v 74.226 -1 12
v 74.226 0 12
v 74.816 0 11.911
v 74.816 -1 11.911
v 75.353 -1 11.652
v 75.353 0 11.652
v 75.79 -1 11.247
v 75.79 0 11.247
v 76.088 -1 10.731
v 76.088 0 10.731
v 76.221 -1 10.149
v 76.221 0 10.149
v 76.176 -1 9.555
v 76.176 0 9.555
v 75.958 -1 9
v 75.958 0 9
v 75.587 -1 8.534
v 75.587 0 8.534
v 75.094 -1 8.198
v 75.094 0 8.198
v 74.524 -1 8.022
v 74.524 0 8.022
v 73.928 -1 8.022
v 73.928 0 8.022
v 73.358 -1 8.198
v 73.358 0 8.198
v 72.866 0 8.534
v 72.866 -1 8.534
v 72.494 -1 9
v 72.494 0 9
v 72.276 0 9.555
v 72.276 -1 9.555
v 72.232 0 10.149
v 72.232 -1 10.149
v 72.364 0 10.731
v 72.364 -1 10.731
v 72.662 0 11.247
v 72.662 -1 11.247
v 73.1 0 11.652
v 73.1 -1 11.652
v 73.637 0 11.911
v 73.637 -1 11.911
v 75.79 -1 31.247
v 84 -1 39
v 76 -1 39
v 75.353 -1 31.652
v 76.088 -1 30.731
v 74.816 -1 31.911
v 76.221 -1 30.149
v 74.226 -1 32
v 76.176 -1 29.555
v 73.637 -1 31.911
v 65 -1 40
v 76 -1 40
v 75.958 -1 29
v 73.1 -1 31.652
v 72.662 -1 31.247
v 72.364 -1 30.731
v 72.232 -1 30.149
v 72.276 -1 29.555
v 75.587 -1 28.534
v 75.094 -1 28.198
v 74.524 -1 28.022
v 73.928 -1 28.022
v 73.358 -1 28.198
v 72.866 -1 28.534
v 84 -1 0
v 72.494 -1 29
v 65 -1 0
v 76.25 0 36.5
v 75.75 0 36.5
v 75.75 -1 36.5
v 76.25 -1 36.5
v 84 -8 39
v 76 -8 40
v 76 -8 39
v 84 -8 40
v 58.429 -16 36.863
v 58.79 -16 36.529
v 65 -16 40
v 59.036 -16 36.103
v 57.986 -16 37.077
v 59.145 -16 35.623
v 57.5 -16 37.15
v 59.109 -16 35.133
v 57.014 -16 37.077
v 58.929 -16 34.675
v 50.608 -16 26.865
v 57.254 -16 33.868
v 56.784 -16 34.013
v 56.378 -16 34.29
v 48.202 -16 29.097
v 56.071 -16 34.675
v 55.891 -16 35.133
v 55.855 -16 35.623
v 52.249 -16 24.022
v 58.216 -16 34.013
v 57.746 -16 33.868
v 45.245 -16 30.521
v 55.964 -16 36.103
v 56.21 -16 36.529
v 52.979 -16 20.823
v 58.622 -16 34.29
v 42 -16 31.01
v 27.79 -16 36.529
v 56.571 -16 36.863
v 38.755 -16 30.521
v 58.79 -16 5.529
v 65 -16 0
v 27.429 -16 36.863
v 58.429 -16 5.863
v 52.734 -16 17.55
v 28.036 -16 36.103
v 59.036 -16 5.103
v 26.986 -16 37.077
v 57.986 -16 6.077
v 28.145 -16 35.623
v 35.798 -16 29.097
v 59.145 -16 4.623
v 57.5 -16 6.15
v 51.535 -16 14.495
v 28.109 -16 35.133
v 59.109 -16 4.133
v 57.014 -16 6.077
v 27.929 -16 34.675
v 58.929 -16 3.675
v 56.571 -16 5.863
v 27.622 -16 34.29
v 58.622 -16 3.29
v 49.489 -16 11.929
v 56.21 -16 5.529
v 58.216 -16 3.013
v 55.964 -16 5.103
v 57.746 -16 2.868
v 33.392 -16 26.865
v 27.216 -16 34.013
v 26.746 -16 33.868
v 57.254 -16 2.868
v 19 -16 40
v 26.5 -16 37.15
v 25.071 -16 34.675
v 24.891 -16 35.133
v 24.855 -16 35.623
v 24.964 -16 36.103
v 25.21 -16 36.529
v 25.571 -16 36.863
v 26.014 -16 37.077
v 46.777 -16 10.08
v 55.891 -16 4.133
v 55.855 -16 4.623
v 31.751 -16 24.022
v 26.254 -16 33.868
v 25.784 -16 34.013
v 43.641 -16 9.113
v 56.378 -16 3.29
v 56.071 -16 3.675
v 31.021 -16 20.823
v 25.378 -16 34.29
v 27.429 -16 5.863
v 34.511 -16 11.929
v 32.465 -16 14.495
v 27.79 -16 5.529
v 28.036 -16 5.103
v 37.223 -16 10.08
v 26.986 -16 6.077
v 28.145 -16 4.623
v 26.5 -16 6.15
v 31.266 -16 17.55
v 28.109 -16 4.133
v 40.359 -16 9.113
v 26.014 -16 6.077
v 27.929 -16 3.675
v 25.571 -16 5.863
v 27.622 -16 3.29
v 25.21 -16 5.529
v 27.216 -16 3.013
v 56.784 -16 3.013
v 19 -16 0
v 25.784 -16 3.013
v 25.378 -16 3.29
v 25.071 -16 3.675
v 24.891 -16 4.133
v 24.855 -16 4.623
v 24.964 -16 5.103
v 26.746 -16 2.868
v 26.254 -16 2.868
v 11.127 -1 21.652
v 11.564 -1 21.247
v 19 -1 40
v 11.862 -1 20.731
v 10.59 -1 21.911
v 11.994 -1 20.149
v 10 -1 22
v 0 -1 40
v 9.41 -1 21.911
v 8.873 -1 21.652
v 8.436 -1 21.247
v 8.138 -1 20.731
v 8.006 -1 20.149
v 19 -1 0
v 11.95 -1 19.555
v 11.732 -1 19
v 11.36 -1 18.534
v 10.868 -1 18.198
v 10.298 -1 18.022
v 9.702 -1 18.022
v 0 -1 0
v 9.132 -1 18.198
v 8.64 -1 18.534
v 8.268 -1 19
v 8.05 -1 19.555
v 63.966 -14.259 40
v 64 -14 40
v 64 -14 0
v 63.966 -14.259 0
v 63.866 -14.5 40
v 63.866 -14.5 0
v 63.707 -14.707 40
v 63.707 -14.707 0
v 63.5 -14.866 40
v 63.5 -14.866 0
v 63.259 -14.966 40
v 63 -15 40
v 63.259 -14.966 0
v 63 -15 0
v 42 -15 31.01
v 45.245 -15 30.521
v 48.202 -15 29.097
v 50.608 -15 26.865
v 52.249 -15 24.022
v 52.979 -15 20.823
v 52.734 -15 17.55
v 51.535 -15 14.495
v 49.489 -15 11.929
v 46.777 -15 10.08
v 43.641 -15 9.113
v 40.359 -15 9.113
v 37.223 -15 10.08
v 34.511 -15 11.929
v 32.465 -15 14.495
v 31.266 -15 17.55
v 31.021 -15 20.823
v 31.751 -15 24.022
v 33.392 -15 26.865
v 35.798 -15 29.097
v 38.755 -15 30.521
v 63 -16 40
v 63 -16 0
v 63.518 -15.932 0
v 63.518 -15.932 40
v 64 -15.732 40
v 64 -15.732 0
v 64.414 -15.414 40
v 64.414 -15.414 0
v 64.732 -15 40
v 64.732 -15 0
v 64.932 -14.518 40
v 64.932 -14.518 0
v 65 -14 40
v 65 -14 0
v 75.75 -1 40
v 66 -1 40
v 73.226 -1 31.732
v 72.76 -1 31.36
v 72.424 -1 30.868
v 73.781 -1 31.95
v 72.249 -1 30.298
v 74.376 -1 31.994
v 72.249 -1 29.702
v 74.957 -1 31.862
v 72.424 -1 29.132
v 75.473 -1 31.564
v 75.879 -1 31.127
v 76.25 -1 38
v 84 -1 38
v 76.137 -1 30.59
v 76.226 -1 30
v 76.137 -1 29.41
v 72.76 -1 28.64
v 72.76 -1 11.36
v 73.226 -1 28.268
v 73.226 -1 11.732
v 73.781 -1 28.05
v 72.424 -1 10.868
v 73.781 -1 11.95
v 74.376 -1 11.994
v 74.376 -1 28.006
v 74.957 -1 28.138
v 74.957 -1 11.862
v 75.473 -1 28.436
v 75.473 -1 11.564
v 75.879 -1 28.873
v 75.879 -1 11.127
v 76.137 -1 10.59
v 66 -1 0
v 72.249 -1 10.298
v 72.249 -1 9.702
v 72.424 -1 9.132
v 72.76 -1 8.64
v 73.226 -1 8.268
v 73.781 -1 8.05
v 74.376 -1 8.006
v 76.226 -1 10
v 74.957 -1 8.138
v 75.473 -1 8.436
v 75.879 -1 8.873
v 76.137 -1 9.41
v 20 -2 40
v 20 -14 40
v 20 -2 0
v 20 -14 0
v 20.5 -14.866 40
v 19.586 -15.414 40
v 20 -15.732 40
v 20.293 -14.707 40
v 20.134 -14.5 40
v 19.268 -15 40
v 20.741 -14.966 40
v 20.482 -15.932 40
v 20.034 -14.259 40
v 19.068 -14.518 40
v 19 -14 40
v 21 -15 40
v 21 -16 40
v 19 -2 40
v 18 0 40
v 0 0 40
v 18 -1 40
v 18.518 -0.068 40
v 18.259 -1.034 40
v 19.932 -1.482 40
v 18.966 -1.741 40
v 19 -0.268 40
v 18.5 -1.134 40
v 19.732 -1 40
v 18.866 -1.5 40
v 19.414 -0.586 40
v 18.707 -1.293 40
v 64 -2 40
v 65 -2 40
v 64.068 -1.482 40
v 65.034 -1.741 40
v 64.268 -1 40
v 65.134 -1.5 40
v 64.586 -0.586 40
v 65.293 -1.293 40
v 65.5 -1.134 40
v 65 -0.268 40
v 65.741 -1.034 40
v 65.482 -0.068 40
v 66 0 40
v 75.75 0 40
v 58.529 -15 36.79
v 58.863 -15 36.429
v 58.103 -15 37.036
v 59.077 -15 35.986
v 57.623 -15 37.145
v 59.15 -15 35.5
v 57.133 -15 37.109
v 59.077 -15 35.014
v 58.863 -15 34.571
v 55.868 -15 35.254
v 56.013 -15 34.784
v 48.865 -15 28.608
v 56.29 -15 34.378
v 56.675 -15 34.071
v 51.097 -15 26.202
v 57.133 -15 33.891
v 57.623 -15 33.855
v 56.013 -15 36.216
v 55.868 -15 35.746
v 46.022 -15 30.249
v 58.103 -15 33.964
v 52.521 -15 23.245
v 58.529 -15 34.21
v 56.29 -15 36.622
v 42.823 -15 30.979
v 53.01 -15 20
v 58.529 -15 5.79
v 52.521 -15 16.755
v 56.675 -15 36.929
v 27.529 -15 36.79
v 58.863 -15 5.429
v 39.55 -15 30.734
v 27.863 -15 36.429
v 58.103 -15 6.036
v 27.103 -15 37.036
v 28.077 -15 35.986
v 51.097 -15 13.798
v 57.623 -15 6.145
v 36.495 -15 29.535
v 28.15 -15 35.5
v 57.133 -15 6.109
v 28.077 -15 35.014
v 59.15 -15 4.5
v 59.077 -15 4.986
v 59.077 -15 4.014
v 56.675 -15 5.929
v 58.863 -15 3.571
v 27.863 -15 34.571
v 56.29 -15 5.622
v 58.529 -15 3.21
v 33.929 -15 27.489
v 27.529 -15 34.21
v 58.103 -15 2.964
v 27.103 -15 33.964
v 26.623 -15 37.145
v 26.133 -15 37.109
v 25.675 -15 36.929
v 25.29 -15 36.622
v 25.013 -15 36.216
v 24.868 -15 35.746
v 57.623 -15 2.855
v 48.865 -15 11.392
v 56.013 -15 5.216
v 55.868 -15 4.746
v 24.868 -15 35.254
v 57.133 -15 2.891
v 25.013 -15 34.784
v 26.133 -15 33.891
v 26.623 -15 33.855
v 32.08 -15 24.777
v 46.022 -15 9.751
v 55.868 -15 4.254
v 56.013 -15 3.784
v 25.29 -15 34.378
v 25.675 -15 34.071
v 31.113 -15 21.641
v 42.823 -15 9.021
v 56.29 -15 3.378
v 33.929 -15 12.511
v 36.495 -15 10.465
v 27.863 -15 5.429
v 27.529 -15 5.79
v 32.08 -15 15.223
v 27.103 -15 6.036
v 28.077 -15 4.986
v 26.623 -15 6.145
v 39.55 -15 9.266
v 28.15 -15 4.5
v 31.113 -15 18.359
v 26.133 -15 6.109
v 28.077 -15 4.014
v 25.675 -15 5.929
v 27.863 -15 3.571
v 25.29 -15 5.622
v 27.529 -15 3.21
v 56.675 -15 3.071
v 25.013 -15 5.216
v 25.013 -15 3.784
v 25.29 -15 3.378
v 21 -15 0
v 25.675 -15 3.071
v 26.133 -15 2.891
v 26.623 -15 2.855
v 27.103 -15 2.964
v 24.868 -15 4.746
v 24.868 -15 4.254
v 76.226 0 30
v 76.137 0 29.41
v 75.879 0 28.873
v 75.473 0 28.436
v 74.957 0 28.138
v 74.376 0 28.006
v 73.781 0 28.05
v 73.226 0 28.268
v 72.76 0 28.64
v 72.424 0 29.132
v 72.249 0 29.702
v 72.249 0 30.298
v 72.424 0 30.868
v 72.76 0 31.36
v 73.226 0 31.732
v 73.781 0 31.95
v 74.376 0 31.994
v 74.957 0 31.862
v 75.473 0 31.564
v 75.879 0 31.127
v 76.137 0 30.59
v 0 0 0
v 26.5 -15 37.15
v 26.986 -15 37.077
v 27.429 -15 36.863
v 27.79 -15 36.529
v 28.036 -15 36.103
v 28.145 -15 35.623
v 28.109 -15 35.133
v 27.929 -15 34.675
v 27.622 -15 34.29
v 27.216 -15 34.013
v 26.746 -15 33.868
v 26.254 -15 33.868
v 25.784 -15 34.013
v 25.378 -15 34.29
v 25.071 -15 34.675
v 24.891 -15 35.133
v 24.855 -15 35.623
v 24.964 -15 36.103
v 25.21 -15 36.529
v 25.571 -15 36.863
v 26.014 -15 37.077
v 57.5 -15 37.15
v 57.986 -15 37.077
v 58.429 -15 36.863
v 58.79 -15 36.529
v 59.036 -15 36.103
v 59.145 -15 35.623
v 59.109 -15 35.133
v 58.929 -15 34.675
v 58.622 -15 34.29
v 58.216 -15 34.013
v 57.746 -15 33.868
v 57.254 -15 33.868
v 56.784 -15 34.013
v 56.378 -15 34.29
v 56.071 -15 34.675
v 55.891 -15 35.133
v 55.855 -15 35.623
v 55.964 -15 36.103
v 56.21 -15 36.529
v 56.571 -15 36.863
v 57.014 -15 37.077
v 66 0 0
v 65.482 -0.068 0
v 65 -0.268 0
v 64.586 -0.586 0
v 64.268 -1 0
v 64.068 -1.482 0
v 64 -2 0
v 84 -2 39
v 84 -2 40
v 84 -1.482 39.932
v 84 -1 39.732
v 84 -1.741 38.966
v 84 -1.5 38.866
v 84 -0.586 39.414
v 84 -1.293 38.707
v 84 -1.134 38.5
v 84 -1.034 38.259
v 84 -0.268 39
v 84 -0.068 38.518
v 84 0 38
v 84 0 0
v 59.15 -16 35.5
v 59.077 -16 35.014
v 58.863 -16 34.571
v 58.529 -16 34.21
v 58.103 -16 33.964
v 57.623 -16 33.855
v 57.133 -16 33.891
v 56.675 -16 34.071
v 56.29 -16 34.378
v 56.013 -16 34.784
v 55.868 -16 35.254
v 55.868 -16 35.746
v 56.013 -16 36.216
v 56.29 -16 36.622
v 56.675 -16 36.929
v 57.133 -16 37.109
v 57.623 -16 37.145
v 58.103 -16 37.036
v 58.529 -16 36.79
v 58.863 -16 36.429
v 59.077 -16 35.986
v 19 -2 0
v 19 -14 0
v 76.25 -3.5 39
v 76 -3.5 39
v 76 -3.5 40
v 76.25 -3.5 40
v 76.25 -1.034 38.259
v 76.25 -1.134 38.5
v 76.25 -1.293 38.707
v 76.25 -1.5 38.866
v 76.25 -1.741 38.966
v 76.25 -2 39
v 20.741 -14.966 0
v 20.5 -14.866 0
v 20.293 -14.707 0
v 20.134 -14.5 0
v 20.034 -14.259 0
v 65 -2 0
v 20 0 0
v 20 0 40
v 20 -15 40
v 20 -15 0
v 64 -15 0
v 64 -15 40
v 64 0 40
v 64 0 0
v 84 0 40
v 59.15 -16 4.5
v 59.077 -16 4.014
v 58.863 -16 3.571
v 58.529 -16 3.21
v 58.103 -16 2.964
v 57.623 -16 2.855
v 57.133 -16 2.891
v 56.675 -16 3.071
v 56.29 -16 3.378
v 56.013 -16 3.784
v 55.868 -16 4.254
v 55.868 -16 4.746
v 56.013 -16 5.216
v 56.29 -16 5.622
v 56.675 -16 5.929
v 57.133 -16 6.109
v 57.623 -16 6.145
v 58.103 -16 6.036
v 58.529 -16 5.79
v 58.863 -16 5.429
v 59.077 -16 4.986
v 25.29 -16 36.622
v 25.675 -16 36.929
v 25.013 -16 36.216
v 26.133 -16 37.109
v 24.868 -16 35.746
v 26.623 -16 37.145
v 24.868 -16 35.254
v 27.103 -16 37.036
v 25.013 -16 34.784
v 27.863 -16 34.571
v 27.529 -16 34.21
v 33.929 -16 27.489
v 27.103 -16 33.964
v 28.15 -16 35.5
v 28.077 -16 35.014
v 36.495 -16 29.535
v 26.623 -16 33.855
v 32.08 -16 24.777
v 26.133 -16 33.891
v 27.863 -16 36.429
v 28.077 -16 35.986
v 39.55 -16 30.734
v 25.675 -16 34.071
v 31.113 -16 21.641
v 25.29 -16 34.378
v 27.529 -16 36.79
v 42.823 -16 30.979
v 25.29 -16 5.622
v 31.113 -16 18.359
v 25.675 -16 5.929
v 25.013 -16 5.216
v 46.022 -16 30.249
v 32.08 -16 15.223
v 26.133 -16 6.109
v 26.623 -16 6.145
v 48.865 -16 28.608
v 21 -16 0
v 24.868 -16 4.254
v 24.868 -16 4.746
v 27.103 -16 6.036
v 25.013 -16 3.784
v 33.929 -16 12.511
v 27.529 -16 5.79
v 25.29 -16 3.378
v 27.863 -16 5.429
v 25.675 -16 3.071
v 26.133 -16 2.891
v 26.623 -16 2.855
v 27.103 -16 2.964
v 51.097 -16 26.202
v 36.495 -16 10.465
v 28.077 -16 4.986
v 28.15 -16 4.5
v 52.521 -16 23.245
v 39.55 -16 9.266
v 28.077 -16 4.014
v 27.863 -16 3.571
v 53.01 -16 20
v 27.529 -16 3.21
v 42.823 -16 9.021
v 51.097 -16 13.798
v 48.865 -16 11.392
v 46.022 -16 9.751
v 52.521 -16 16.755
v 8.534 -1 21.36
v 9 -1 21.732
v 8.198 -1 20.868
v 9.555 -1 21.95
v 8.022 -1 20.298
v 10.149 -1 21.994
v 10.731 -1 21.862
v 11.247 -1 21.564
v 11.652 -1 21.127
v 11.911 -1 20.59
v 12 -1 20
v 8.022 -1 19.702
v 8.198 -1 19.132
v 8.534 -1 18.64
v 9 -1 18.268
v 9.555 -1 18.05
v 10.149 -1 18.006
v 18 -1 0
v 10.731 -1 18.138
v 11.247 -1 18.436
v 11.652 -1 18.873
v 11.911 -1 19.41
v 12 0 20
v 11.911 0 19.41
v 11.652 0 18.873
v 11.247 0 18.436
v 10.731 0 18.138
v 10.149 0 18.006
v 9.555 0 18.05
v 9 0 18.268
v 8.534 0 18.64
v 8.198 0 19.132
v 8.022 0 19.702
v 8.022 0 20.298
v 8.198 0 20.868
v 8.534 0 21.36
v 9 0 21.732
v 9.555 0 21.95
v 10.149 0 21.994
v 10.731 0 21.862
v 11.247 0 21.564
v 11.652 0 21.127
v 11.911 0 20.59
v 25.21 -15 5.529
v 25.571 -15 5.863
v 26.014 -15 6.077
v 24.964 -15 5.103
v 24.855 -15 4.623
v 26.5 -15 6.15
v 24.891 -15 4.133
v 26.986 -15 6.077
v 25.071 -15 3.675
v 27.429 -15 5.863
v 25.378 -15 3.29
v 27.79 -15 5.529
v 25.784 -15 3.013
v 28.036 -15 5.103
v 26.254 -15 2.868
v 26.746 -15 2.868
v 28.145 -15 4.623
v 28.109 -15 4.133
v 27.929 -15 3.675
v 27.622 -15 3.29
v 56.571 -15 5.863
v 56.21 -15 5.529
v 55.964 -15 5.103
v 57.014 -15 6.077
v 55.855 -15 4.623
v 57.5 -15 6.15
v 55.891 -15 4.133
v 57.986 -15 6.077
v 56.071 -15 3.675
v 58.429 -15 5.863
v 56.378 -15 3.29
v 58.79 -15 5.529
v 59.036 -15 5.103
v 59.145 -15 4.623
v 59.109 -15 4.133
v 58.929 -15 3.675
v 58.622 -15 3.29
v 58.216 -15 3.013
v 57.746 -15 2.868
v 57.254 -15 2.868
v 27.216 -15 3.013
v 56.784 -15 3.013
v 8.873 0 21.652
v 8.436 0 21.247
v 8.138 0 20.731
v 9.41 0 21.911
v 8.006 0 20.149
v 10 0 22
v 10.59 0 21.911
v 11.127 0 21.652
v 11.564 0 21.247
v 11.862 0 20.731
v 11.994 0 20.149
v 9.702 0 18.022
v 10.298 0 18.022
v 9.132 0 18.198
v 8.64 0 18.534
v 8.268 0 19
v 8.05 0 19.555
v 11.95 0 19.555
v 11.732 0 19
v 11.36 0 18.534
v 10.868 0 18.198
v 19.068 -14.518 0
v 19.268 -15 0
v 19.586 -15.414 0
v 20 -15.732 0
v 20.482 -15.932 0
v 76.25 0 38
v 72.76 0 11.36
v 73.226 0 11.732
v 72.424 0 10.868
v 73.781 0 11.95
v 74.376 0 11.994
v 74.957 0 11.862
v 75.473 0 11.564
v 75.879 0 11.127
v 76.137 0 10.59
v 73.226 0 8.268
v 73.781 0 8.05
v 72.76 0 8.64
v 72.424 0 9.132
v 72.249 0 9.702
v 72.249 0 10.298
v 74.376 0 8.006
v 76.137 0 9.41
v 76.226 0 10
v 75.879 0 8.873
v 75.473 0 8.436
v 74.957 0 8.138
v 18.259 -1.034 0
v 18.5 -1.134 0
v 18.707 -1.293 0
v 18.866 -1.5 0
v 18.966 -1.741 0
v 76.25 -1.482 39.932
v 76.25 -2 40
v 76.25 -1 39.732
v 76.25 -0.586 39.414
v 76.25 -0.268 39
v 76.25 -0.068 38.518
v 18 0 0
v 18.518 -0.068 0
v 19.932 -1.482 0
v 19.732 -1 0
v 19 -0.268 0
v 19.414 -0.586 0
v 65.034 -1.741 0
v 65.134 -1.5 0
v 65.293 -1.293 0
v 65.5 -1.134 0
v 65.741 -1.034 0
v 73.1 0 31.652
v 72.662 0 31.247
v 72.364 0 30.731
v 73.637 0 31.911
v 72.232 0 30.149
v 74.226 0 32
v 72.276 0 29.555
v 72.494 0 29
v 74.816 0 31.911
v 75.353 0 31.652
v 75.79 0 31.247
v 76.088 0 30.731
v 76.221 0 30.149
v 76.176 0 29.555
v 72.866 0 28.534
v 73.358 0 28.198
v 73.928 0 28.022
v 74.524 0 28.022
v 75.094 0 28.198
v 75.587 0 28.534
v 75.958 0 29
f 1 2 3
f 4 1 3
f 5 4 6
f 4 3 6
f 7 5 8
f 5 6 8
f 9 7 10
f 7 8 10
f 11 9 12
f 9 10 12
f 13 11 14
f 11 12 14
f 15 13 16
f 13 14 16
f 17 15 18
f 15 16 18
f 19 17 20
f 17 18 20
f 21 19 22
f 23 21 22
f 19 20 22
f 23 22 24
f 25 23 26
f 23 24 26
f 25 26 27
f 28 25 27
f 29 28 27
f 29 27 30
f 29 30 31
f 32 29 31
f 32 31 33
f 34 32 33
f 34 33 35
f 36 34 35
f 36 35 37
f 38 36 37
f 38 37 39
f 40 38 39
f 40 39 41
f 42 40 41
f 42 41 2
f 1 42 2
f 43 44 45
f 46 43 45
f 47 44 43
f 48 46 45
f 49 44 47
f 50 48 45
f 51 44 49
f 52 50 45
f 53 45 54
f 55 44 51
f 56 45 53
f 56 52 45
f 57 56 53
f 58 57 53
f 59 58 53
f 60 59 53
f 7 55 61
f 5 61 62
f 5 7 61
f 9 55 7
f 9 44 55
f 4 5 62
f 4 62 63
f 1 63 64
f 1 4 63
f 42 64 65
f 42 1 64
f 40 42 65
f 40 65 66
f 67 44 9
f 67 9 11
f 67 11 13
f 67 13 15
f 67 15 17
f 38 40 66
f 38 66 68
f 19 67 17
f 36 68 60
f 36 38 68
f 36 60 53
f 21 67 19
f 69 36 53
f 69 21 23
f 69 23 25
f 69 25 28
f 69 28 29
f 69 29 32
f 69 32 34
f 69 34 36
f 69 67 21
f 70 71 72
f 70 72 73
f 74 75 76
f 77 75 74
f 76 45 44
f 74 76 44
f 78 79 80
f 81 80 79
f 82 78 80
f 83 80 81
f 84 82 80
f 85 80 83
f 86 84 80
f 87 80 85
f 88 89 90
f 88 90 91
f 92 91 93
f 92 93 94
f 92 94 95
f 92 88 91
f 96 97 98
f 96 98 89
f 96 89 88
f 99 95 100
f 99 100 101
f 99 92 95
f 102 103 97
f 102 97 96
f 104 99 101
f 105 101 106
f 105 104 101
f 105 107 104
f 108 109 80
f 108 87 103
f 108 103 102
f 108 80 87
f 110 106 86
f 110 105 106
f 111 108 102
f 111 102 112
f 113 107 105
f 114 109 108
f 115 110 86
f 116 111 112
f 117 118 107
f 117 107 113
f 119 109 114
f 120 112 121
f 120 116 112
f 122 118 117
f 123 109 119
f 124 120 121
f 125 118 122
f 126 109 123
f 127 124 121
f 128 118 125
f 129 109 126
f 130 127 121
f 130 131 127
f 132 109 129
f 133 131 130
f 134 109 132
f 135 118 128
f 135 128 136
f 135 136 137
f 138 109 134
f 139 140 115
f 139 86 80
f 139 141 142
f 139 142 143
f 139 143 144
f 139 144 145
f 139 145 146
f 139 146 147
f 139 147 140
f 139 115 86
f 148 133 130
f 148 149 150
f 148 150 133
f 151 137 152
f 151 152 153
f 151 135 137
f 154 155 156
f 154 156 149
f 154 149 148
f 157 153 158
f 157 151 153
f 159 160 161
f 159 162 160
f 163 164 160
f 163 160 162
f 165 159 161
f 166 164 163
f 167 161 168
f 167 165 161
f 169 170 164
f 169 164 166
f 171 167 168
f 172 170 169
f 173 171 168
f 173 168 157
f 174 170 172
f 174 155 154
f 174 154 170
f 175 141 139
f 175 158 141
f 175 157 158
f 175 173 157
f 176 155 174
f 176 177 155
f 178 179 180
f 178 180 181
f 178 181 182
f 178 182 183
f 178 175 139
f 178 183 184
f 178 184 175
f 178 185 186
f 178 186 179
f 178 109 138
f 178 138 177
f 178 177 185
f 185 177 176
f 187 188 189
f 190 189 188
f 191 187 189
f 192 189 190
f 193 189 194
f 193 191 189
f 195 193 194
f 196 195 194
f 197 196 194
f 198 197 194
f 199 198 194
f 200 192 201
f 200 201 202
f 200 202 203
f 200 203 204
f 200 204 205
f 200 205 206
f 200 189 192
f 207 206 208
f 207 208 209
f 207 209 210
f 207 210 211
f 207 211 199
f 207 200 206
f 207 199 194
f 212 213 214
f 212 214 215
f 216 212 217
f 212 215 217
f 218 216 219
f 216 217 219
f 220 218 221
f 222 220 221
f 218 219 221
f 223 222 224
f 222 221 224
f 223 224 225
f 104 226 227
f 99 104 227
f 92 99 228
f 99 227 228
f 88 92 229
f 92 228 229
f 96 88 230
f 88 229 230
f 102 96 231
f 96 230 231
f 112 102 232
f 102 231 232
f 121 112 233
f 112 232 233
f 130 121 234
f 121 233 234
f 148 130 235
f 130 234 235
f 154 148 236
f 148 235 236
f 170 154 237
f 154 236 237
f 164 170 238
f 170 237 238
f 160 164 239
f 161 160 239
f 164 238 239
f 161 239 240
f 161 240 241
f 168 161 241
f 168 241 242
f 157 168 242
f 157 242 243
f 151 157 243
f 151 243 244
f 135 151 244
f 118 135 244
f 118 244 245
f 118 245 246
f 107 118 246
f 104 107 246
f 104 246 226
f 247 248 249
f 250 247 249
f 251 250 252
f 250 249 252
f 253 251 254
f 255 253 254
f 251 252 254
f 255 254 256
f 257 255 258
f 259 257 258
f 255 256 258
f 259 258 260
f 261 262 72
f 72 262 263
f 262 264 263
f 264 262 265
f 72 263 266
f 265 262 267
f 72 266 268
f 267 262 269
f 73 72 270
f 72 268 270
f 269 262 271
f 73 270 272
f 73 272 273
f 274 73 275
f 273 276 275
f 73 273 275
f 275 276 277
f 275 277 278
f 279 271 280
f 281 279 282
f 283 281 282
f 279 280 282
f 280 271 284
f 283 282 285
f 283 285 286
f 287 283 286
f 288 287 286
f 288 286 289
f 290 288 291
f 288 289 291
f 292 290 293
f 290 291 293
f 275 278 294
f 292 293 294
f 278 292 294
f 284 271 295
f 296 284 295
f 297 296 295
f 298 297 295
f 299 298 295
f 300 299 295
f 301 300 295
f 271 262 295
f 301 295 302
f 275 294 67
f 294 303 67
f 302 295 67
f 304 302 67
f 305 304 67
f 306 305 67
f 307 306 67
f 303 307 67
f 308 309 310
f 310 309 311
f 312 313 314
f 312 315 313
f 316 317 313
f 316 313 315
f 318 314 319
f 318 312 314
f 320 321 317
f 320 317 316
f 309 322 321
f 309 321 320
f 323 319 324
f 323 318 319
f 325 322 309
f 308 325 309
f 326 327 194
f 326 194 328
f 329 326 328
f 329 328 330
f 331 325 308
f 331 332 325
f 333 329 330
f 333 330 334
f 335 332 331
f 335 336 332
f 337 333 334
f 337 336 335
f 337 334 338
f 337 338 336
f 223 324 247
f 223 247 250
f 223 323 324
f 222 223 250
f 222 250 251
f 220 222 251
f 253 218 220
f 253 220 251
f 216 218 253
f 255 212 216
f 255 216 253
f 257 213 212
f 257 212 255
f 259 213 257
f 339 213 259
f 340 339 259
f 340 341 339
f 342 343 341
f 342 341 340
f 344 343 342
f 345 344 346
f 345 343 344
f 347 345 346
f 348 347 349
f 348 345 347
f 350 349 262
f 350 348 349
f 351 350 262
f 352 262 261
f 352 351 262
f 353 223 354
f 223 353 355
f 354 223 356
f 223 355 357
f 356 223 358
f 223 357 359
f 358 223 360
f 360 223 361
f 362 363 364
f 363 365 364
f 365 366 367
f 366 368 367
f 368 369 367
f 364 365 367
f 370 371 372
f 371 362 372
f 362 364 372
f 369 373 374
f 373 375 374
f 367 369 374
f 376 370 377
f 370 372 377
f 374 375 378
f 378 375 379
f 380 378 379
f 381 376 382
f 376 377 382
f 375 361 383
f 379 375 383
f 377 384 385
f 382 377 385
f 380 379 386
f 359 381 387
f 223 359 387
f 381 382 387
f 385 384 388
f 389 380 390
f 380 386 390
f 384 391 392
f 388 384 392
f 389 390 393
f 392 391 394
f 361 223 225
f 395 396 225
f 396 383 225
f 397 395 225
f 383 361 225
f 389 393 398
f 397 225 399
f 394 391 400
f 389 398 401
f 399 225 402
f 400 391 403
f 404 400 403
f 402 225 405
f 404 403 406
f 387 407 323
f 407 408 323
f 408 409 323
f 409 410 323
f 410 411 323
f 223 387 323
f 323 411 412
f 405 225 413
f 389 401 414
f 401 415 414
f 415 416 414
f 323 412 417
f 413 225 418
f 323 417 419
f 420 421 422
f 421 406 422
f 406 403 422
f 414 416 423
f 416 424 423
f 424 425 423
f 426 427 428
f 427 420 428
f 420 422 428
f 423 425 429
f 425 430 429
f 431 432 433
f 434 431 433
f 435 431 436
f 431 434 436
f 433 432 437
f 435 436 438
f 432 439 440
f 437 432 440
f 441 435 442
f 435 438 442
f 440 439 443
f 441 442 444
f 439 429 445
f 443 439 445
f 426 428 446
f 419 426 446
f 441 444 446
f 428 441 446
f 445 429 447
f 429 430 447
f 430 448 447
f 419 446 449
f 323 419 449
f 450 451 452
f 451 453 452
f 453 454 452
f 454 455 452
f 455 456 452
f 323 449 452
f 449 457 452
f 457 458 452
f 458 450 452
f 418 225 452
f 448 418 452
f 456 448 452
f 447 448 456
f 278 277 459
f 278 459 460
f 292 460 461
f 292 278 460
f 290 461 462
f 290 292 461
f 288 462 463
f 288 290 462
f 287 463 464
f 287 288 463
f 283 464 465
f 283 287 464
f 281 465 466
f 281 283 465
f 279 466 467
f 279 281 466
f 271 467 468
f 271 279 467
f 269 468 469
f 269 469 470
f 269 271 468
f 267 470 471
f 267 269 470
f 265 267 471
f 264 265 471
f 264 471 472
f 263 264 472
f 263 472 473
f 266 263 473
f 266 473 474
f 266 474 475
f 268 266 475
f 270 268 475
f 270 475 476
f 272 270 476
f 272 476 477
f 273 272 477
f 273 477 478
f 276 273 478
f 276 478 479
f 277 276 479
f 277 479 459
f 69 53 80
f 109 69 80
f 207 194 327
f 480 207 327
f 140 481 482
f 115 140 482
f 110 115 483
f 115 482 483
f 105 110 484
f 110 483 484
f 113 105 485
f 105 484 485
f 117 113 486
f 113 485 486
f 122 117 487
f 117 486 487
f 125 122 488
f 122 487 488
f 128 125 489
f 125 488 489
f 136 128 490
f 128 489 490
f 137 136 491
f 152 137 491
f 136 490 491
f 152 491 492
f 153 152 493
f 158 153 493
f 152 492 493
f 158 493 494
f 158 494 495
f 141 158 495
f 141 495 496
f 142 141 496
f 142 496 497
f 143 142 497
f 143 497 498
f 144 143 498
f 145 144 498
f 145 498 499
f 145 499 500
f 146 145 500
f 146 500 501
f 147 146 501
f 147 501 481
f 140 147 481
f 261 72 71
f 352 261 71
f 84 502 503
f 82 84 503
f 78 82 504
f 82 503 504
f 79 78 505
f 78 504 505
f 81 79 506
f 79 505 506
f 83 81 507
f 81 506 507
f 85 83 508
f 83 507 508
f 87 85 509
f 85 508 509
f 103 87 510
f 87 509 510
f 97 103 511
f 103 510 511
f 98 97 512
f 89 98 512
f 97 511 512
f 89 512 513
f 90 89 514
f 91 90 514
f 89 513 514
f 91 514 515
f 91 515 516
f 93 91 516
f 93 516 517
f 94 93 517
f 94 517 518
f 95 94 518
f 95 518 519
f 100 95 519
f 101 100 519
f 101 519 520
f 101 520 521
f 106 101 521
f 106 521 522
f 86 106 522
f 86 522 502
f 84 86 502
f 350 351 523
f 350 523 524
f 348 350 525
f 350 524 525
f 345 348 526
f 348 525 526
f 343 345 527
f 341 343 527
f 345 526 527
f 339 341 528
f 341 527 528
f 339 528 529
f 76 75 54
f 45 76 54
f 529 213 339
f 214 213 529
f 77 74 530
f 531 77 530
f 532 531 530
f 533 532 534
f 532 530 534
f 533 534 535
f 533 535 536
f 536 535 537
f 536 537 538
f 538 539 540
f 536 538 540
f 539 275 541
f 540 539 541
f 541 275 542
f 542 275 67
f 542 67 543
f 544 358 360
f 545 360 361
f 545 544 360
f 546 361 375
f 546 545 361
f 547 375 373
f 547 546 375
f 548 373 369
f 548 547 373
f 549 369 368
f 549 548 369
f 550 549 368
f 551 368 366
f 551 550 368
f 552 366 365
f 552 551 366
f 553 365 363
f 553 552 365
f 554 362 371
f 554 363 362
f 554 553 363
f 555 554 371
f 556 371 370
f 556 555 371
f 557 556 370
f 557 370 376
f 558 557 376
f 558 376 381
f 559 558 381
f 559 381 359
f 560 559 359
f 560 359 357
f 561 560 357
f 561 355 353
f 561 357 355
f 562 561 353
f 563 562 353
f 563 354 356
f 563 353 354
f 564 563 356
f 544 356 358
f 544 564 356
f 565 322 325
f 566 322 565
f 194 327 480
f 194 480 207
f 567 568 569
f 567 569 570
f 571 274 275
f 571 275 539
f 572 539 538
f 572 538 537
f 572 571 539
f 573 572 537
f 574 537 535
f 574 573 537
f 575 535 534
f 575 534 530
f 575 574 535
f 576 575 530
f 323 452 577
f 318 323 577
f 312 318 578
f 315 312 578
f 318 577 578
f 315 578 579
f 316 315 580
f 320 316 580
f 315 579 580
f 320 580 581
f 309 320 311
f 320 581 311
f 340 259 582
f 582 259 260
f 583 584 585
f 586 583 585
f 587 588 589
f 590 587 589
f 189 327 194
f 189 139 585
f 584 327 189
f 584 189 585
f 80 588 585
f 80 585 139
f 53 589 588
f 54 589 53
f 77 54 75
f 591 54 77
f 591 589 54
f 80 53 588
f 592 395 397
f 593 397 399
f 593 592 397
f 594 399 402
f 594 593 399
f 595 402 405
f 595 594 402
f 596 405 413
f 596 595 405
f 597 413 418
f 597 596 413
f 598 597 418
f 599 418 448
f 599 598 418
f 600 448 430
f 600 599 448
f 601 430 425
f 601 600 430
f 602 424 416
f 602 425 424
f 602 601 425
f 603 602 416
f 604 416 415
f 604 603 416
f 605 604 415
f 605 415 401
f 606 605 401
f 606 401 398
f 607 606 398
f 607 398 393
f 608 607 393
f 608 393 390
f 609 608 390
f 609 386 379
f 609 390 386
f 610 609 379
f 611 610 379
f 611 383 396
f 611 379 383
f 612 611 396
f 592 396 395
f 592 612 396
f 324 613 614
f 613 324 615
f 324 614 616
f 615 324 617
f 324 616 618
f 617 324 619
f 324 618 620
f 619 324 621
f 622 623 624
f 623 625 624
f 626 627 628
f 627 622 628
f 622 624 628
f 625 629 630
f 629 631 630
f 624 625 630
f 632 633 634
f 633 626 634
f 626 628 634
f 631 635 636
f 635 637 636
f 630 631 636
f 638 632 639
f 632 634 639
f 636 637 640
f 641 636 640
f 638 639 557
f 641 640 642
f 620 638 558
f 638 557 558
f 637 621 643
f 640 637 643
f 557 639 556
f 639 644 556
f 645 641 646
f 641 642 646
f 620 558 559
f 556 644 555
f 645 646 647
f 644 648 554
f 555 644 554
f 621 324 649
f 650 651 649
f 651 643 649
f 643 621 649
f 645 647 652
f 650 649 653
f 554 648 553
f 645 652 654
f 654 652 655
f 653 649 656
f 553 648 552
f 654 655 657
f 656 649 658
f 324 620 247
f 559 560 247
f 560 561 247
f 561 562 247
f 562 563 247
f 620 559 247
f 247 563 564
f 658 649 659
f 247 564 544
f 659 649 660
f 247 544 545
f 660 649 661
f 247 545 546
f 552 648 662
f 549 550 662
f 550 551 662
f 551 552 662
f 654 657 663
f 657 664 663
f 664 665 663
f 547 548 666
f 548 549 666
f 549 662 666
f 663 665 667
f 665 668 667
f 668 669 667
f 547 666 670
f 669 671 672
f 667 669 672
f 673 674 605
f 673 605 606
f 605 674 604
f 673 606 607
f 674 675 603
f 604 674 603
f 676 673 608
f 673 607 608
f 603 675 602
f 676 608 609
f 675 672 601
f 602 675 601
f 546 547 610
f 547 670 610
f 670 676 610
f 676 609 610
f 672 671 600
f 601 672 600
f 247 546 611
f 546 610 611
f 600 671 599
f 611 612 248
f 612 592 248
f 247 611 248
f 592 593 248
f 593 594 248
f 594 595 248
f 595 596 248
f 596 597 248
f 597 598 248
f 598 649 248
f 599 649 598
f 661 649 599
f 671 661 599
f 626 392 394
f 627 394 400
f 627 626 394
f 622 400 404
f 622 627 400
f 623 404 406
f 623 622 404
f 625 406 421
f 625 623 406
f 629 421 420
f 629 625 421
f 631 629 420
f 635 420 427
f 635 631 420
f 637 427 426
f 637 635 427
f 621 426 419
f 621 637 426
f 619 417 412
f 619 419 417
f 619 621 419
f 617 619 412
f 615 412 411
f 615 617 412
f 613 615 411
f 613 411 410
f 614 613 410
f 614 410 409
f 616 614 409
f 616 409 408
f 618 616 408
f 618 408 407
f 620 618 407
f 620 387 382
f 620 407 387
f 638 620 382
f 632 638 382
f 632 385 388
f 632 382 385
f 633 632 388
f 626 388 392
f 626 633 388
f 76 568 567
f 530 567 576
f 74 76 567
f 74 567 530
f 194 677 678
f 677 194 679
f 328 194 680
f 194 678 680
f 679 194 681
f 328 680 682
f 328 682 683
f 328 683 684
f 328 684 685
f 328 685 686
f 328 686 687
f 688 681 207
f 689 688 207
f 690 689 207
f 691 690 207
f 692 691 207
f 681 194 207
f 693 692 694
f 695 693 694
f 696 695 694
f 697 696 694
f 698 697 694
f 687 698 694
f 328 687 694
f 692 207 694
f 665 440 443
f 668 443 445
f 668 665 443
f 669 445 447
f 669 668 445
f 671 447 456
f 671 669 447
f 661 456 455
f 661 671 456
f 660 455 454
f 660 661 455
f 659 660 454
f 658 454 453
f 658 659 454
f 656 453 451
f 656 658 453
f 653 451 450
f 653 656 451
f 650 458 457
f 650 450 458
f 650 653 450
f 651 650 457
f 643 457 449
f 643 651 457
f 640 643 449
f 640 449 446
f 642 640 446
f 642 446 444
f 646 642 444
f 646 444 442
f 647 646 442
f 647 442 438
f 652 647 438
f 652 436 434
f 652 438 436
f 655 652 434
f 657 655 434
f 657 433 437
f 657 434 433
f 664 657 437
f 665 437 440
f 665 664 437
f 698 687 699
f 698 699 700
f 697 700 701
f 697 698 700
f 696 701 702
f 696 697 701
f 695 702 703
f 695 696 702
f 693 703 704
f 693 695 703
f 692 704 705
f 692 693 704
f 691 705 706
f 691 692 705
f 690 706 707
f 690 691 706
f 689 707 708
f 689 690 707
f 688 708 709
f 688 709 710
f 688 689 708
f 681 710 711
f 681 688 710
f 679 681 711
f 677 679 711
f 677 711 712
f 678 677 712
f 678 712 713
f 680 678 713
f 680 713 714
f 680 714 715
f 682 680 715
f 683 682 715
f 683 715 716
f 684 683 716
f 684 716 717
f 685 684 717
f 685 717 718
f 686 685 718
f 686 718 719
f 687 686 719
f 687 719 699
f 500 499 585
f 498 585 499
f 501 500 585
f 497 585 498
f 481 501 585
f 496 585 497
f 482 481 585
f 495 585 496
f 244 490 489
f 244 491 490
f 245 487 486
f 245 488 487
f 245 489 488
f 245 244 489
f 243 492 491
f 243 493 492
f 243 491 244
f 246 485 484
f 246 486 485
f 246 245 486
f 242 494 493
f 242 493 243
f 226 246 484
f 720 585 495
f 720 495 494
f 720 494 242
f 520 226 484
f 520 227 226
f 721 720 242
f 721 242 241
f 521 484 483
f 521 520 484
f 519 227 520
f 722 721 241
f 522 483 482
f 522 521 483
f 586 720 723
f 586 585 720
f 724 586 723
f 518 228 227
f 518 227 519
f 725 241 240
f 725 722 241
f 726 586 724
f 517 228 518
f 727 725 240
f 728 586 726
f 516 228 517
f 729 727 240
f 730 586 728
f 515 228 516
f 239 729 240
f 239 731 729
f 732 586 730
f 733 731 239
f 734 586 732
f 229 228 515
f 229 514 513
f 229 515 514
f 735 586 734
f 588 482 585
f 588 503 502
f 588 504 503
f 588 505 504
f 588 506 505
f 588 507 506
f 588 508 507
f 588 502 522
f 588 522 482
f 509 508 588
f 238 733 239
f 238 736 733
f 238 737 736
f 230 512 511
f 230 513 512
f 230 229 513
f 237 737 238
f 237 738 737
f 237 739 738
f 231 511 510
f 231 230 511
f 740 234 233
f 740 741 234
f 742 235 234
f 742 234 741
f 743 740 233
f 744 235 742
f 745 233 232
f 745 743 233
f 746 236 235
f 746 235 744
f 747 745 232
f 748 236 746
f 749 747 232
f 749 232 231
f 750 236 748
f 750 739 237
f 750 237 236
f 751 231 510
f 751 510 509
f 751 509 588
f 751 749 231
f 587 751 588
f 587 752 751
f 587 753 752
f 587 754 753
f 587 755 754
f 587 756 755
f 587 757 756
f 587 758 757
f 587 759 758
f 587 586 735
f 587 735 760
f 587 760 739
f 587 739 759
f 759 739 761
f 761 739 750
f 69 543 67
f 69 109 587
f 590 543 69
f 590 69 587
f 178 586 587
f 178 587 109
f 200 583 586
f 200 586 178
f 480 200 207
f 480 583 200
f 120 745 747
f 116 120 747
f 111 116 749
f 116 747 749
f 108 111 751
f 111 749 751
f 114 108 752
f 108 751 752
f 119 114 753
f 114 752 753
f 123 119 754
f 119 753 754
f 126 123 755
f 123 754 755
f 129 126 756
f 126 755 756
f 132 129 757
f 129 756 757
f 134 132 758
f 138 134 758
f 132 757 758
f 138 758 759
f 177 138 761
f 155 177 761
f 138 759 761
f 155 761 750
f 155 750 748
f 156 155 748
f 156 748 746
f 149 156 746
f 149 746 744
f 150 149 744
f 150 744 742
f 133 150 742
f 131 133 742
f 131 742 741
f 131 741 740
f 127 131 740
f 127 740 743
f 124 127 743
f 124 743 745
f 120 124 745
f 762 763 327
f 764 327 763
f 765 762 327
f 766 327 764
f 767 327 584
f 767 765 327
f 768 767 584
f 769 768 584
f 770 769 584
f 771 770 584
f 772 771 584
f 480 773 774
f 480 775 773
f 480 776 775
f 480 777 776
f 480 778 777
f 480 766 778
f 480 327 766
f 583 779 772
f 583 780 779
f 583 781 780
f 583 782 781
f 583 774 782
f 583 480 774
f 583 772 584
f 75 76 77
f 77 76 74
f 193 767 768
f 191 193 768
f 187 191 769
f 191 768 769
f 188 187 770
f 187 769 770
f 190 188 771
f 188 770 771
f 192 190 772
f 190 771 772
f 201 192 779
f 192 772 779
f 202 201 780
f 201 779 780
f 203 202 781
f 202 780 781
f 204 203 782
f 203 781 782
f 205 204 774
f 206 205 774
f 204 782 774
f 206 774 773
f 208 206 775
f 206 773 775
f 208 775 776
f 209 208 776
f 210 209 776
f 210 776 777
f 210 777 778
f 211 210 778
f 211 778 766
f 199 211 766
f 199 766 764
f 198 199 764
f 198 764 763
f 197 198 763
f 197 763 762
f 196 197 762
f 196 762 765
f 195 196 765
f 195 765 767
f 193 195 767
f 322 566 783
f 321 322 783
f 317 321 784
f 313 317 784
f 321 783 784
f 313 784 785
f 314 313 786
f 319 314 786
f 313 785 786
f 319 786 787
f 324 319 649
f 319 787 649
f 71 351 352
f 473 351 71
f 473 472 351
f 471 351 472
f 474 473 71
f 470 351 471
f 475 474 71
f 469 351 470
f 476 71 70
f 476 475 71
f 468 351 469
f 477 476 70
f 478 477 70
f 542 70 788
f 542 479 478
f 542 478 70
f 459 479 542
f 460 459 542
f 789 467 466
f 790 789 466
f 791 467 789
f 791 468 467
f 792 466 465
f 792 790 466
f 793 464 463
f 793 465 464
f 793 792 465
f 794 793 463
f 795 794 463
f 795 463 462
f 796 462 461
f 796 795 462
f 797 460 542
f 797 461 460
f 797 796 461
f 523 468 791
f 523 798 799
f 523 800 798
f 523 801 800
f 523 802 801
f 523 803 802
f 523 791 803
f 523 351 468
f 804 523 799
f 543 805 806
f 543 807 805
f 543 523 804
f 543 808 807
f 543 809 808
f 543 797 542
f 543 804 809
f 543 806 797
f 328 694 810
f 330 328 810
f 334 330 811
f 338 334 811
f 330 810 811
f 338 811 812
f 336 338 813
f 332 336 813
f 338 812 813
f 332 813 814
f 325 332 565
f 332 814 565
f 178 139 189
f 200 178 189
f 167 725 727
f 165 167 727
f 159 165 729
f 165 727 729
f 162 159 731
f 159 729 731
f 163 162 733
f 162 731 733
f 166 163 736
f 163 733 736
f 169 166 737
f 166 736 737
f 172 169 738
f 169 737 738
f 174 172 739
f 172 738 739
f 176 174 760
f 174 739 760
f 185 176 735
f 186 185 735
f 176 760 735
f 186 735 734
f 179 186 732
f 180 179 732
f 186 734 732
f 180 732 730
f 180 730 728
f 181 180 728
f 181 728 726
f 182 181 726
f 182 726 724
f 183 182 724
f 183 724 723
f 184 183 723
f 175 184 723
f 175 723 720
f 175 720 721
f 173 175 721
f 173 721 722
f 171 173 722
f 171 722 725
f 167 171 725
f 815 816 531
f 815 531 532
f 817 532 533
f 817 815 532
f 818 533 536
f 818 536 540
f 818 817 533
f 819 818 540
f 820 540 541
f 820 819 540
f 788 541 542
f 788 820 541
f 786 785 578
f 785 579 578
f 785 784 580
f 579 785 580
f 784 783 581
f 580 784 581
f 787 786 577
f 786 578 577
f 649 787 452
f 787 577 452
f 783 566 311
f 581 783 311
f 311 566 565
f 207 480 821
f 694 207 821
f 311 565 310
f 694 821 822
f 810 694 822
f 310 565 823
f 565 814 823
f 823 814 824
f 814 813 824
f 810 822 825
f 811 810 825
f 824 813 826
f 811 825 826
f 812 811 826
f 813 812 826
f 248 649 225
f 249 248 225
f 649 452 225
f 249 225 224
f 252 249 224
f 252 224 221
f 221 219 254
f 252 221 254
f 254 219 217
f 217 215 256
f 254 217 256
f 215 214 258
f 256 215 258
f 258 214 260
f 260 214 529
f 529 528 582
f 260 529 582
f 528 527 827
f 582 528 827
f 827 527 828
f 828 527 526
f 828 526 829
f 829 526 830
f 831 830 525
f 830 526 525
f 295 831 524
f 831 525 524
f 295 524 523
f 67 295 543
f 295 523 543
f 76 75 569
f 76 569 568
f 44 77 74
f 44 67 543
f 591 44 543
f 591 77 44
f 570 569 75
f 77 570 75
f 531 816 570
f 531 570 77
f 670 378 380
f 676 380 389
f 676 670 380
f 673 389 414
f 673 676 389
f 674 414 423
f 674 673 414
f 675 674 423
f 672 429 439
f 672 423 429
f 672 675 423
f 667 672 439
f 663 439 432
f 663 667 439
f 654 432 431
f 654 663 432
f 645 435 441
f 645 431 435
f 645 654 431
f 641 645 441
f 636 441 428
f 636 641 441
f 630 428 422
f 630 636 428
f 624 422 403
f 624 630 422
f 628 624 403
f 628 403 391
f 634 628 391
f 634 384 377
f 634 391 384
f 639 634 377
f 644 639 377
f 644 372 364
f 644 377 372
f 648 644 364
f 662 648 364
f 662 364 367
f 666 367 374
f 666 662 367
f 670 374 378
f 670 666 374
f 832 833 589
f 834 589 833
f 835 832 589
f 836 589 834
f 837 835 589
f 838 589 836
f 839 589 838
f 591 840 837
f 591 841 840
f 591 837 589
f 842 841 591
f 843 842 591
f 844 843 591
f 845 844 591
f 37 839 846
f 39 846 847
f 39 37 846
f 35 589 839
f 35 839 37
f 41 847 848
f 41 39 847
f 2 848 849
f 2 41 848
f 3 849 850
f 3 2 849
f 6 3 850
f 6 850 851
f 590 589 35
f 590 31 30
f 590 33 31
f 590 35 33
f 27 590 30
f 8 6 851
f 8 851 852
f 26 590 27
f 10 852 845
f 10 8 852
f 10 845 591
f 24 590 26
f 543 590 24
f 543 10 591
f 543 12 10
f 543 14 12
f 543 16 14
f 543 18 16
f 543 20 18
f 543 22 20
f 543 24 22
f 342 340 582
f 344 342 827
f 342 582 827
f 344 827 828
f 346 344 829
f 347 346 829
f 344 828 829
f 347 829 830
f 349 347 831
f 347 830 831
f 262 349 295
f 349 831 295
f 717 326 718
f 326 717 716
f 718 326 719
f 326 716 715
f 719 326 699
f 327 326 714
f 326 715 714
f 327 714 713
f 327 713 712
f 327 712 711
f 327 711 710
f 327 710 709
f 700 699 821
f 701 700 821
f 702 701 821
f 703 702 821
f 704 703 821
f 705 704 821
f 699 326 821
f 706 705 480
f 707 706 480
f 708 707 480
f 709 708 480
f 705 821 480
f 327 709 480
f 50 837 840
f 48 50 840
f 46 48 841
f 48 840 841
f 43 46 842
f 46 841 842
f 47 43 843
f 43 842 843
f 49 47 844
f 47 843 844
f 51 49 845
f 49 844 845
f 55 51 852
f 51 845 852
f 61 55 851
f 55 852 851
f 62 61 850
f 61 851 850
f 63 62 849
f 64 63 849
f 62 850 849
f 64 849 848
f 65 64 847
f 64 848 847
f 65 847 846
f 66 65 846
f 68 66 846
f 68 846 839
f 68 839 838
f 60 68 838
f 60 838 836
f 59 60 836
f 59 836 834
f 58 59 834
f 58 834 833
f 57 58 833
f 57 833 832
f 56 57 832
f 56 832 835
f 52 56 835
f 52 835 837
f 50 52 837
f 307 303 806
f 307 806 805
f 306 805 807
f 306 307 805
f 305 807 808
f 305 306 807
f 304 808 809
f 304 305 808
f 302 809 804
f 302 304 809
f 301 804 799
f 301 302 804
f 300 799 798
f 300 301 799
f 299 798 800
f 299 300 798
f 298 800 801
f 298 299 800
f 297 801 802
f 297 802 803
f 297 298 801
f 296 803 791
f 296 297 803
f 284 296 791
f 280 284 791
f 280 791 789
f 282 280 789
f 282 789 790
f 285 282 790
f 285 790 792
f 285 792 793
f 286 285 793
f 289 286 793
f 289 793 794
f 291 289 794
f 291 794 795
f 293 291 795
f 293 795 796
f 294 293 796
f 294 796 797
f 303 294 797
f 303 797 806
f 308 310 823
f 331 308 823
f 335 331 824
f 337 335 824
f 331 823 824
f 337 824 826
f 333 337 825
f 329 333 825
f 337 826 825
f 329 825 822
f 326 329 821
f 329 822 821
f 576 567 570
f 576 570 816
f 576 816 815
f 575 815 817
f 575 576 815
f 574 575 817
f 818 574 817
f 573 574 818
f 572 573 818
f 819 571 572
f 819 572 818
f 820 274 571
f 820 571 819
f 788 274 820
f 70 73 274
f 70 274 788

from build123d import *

# Parameters (mm, degrees)
BOSS_EXTRUDE1_DEPTH          = 40
SKETCH2_R                    = 2
CUT_EXTRUDE1_DEPTH           = 95.40338977
SKETCH4_W                    = 8
SKETCH4_H                    = 8
BOSS_EXTRUDE2_DEPTH          = 1
SKETCH5_R                    = 1.65
SKETCH5_R_2                  = 11.01
CUT_EXTRUDE2_DEPTH           = 95.23905772
CONVERT_SOLID1_START         = -14
CONVERT_SOLID1_OUTLINE_W     = 1
CONVERT_SOLID1_OUTLINE_H     = 40
CONVERT_SOLID1_DEPTH         = 12
CONVERT_SOLID1_START_2       = -8
CONVERT_SOLID1_2_OUTLINE_W   = 7.75
CONVERT_SOLID1_2_OUTLINE_H   = 1
CONVERT_SOLID1_2_DEPTH       = 6
CONVERT_SOLID1_3_OUTLINE_W   = 0.25
CONVERT_SOLID1_3_OUTLINE_H   = 1
CONVERT_SOLID1_3_DEPTH       = 4.5
CONVERT_SOLID1_4_OUTLINE_W   = 7.75
CONVERT_SOLID1_4_OUTLINE_H   = 1
CONVERT_SOLID1_4_DEPTH       = 40
CONVERT_SOLID1_5_OUTLINE_W   = 0.5
CONVERT_SOLID1_5_OUTLINE_H   = 1
CONVERT_SOLID1_5_DEPTH       = 36.5
CONVERT_SOLID1_START_3       = 38
CONVERT_SOLID1_6_OUTLINE_W   = 7.75
CONVERT_SOLID1_6_OUTLINE_H   = 1
CONVERT_SOLID1_6_DEPTH       = 2
CONVERT_SOLID1_START_4       = -16
CONVERT_SOLID1_7_OUTLINE_R   = 1.65
CONVERT_SOLID1_7_OUTLINE_R_2 = 11.01
CONVERT_SOLID1_7_OUTLINE_R_3 = 2
CONVERT_SOLID1_7_DEPTH       = 16
CONVERT_SOLID1_START_5       = 76.25
CONVERT_SOLID1_8_DEPTH       = 7.75


with BuildPart() as part:
    # Sketch1 → Boss-Extrude1 (new body)
    with BuildSketch(Plane.XY):
        Polygon((64, 0), (84, 0), (84, -1), (65, -1), (65, -16), (19, -16), (19, -1), (0, -1), (0, 0), (20, 0), (20, -15), (64, -15), align=None)
    extrude(amount=BOSS_EXTRUDE1_DEPTH)

    # Sketch2 → Cut-Extrude1 (cut, through all)
    with BuildSketch(Plane(origin=(0, 0, 0), x_dir=(1, 0, 0), z_dir=(0, 1, 0))):
        with Locations(Location((10, -20, 0), (0, 0, 270))):
            Circle(SKETCH2_R)
        with Locations(Location((74.226162893, -10, 0), (0, 0, 270))):
            Circle(SKETCH2_R)
        with Locations(Location((74.226162893, -30, 0), (0, 0, 270))):
            Circle(SKETCH2_R)
    extrude(amount=-CUT_EXTRUDE1_DEPTH, mode=Mode.SUBTRACT)

    # Sketch4 → Boss-Extrude2 (add)
    with BuildSketch(Plane.XY.offset(40)):
        with Locations((80, -4)):
            Rectangle(SKETCH4_W, SKETCH4_H)
    extrude(amount=-BOSS_EXTRUDE2_DEPTH)

    # Sketch5 → Cut-Extrude2 (cut, through all)
    with BuildSketch(Plane(origin=(0, -15, 0), x_dir=(1, 0, 0), z_dir=(0, 1, 0))):
        with Locations(Location((26.5, -4.5, 0), (0, 0, 270))):
            Circle(SKETCH5_R)
        with Locations(Location((57.5, -4.5, 0), (0, 0, 270))):
            Circle(SKETCH5_R)
        with Locations(Location((26.5, -35.5, 0), (0, 0, 270))):
            Circle(SKETCH5_R)
        with Locations(Location((57.5, -35.5, 0), (0, 0, 270))):
            Circle(SKETCH5_R)
        with Locations(Location((42, -20, 0), (0, 0, 270))):
            Circle(SKETCH5_R_2)
    extrude(amount=-CUT_EXTRUDE2_DEPTH, mode=Mode.SUBTRACT)


with BuildPart() as body_2:
    # Convert-Solid1: read off the stored shape, not the designer's step
    # Convert-Solid1 outline → Convert-Solid1 (new body)
    with BuildSketch(Plane(origin=(0, 0, 0), x_dir=(1, 0, 0), z_dir=(0, 1, 0)).offset(CONVERT_SOLID1_START)):
        with Locations((64.5, -20)):
            Rectangle(CONVERT_SOLID1_OUTLINE_W, CONVERT_SOLID1_OUTLINE_H)
        with Locations((19.5, -20)):
            Rectangle(CONVERT_SOLID1_OUTLINE_W, CONVERT_SOLID1_OUTLINE_H)
    extrude(amount=CONVERT_SOLID1_DEPTH)

    # Convert-Solid1 2 outline → Convert-Solid1 2 (add)
    with BuildSketch(Plane(origin=(0, 0, 0), x_dir=(1, 0, 0), z_dir=(0, 1, 0)).offset(CONVERT_SOLID1_START_2)):
        with Locations((80.125, -39.5)):
            Rectangle(CONVERT_SOLID1_2_OUTLINE_W, CONVERT_SOLID1_2_OUTLINE_H)
    extrude(amount=CONVERT_SOLID1_2_DEPTH)

    # Convert-Solid1 3 outline → Convert-Solid1 3 (add)
    with BuildSketch(Plane(origin=(0, 0, 0), x_dir=(1, 0, 0), z_dir=(0, 1, 0)).offset(CONVERT_SOLID1_START_2)):
        with Locations((76.125, -39.5)):
            Rectangle(CONVERT_SOLID1_3_OUTLINE_W, CONVERT_SOLID1_3_OUTLINE_H)
    extrude(amount=CONVERT_SOLID1_3_DEPTH)

    # Convert-Solid1 4 outline → Convert-Solid1 4 (add)
    with BuildSketch(Plane.XY):
        with Locations((80.125, -0.5)):
            Rectangle(CONVERT_SOLID1_4_OUTLINE_W, CONVERT_SOLID1_4_OUTLINE_H)
        with BuildLine():
            Line((66, -1), (75.75, -1))
            Line((75.75, -1), (75.75, 0))
            Line((75.75, 0), (66, 0))
            ThreePointArc((66, 0), (64.585786438, -0.585786438), (64, -2))
            Line((64, -2), (65, -2))
            ThreePointArc((65, -2), (65.292893219, -1.292893219), (66, -1))
        make_face()
        with BuildLine():
            Line((0, 0), (0, -1))
            Line((0, -1), (18, -1))
            ThreePointArc((18, -1), (18.707106781, -1.292893219), (19, -2))
            Line((19, -2), (20, -2))
            ThreePointArc((20, -2), (19.414213562, -0.585786438), (18, 0))
            Line((18, 0), (0, 0))
        make_face()
        with BuildLine():
            Line((21, -16), (63, -16))
            ThreePointArc((63, -16), (64.414213562, -15.414213562), (65, -14))
            Line((65, -14), (64, -14))
            ThreePointArc((64, -14), (63.707106781, -14.707106781), (63, -15))
            Line((63, -15), (21, -15))
            ThreePointArc((21, -15), (20.292893219, -14.707106781), (20, -14))
            Line((20, -14), (19, -14))
            ThreePointArc((19, -14), (19.585786438, -15.414213562), (21, -16))
        make_face()
    extrude(amount=CONVERT_SOLID1_4_DEPTH)

    # Convert-Solid1 5 outline → Convert-Solid1 5 (add)
    with BuildSketch(Plane.XY):
        with Locations((76, -0.5)):
            Rectangle(CONVERT_SOLID1_5_OUTLINE_W, CONVERT_SOLID1_5_OUTLINE_H)
    extrude(amount=CONVERT_SOLID1_5_DEPTH)

    # Convert-Solid1 6 outline → Convert-Solid1 6 (add)
    with BuildSketch(Plane.XY.offset(CONVERT_SOLID1_START_3)):
        with Locations((80.125, -1.5)):
            Rectangle(CONVERT_SOLID1_6_OUTLINE_W, CONVERT_SOLID1_6_OUTLINE_H)
    extrude(amount=CONVERT_SOLID1_6_DEPTH)

    # Convert-Solid1 7 outline → Convert-Solid1 7 (cut)
    with BuildSketch(Plane(origin=(0, 0, 0), x_dir=(1, 0, 0), z_dir=(0, 1, 0)).offset(CONVERT_SOLID1_START_4)):
        with Locations((26.5, -35.5)):
            Circle(CONVERT_SOLID1_7_OUTLINE_R)
        with Locations((57.5, -35.5)):
            Circle(CONVERT_SOLID1_7_OUTLINE_R)
        with Locations((57.5, -4.5)):
            Circle(CONVERT_SOLID1_7_OUTLINE_R)
        with Locations((26.5, -4.5)):
            Circle(CONVERT_SOLID1_7_OUTLINE_R)
        with Locations((42, -20)):
            Circle(CONVERT_SOLID1_7_OUTLINE_R_2)
        with Locations((10, -20)):
            Circle(CONVERT_SOLID1_7_OUTLINE_R_3)
        with Locations((74.226162893, -30)):
            Circle(CONVERT_SOLID1_7_OUTLINE_R_3)
        with Locations((74.226162893, -10)):
            Circle(CONVERT_SOLID1_7_OUTLINE_R_3)
    extrude(amount=CONVERT_SOLID1_7_DEPTH, mode=Mode.SUBTRACT)

    # Convert-Solid1 8 outline → Convert-Solid1 8 (cut)
    with BuildSketch(Plane.YZ.offset(CONVERT_SOLID1_START_5)):
        with BuildLine():
            ThreePointArc((-2, 40), (-0.585786438, 39.414213562), (0, 38))
            Line((0, 38), (0, 40))
            Line((0, 40), (-2, 40))
        make_face()
        with BuildLine():
            ThreePointArc((-1, 38), (-1.292893219, 38.707106781), (-2, 39))
            Line((-2, 39), (-2, 38))
            Line((-2, 38), (-1, 38))
        make_face()
    extrude(amount=CONVERT_SOLID1_8_DEPTH, mode=Mode.SUBTRACT)


solid = Compound([part.part, body_2.part])
